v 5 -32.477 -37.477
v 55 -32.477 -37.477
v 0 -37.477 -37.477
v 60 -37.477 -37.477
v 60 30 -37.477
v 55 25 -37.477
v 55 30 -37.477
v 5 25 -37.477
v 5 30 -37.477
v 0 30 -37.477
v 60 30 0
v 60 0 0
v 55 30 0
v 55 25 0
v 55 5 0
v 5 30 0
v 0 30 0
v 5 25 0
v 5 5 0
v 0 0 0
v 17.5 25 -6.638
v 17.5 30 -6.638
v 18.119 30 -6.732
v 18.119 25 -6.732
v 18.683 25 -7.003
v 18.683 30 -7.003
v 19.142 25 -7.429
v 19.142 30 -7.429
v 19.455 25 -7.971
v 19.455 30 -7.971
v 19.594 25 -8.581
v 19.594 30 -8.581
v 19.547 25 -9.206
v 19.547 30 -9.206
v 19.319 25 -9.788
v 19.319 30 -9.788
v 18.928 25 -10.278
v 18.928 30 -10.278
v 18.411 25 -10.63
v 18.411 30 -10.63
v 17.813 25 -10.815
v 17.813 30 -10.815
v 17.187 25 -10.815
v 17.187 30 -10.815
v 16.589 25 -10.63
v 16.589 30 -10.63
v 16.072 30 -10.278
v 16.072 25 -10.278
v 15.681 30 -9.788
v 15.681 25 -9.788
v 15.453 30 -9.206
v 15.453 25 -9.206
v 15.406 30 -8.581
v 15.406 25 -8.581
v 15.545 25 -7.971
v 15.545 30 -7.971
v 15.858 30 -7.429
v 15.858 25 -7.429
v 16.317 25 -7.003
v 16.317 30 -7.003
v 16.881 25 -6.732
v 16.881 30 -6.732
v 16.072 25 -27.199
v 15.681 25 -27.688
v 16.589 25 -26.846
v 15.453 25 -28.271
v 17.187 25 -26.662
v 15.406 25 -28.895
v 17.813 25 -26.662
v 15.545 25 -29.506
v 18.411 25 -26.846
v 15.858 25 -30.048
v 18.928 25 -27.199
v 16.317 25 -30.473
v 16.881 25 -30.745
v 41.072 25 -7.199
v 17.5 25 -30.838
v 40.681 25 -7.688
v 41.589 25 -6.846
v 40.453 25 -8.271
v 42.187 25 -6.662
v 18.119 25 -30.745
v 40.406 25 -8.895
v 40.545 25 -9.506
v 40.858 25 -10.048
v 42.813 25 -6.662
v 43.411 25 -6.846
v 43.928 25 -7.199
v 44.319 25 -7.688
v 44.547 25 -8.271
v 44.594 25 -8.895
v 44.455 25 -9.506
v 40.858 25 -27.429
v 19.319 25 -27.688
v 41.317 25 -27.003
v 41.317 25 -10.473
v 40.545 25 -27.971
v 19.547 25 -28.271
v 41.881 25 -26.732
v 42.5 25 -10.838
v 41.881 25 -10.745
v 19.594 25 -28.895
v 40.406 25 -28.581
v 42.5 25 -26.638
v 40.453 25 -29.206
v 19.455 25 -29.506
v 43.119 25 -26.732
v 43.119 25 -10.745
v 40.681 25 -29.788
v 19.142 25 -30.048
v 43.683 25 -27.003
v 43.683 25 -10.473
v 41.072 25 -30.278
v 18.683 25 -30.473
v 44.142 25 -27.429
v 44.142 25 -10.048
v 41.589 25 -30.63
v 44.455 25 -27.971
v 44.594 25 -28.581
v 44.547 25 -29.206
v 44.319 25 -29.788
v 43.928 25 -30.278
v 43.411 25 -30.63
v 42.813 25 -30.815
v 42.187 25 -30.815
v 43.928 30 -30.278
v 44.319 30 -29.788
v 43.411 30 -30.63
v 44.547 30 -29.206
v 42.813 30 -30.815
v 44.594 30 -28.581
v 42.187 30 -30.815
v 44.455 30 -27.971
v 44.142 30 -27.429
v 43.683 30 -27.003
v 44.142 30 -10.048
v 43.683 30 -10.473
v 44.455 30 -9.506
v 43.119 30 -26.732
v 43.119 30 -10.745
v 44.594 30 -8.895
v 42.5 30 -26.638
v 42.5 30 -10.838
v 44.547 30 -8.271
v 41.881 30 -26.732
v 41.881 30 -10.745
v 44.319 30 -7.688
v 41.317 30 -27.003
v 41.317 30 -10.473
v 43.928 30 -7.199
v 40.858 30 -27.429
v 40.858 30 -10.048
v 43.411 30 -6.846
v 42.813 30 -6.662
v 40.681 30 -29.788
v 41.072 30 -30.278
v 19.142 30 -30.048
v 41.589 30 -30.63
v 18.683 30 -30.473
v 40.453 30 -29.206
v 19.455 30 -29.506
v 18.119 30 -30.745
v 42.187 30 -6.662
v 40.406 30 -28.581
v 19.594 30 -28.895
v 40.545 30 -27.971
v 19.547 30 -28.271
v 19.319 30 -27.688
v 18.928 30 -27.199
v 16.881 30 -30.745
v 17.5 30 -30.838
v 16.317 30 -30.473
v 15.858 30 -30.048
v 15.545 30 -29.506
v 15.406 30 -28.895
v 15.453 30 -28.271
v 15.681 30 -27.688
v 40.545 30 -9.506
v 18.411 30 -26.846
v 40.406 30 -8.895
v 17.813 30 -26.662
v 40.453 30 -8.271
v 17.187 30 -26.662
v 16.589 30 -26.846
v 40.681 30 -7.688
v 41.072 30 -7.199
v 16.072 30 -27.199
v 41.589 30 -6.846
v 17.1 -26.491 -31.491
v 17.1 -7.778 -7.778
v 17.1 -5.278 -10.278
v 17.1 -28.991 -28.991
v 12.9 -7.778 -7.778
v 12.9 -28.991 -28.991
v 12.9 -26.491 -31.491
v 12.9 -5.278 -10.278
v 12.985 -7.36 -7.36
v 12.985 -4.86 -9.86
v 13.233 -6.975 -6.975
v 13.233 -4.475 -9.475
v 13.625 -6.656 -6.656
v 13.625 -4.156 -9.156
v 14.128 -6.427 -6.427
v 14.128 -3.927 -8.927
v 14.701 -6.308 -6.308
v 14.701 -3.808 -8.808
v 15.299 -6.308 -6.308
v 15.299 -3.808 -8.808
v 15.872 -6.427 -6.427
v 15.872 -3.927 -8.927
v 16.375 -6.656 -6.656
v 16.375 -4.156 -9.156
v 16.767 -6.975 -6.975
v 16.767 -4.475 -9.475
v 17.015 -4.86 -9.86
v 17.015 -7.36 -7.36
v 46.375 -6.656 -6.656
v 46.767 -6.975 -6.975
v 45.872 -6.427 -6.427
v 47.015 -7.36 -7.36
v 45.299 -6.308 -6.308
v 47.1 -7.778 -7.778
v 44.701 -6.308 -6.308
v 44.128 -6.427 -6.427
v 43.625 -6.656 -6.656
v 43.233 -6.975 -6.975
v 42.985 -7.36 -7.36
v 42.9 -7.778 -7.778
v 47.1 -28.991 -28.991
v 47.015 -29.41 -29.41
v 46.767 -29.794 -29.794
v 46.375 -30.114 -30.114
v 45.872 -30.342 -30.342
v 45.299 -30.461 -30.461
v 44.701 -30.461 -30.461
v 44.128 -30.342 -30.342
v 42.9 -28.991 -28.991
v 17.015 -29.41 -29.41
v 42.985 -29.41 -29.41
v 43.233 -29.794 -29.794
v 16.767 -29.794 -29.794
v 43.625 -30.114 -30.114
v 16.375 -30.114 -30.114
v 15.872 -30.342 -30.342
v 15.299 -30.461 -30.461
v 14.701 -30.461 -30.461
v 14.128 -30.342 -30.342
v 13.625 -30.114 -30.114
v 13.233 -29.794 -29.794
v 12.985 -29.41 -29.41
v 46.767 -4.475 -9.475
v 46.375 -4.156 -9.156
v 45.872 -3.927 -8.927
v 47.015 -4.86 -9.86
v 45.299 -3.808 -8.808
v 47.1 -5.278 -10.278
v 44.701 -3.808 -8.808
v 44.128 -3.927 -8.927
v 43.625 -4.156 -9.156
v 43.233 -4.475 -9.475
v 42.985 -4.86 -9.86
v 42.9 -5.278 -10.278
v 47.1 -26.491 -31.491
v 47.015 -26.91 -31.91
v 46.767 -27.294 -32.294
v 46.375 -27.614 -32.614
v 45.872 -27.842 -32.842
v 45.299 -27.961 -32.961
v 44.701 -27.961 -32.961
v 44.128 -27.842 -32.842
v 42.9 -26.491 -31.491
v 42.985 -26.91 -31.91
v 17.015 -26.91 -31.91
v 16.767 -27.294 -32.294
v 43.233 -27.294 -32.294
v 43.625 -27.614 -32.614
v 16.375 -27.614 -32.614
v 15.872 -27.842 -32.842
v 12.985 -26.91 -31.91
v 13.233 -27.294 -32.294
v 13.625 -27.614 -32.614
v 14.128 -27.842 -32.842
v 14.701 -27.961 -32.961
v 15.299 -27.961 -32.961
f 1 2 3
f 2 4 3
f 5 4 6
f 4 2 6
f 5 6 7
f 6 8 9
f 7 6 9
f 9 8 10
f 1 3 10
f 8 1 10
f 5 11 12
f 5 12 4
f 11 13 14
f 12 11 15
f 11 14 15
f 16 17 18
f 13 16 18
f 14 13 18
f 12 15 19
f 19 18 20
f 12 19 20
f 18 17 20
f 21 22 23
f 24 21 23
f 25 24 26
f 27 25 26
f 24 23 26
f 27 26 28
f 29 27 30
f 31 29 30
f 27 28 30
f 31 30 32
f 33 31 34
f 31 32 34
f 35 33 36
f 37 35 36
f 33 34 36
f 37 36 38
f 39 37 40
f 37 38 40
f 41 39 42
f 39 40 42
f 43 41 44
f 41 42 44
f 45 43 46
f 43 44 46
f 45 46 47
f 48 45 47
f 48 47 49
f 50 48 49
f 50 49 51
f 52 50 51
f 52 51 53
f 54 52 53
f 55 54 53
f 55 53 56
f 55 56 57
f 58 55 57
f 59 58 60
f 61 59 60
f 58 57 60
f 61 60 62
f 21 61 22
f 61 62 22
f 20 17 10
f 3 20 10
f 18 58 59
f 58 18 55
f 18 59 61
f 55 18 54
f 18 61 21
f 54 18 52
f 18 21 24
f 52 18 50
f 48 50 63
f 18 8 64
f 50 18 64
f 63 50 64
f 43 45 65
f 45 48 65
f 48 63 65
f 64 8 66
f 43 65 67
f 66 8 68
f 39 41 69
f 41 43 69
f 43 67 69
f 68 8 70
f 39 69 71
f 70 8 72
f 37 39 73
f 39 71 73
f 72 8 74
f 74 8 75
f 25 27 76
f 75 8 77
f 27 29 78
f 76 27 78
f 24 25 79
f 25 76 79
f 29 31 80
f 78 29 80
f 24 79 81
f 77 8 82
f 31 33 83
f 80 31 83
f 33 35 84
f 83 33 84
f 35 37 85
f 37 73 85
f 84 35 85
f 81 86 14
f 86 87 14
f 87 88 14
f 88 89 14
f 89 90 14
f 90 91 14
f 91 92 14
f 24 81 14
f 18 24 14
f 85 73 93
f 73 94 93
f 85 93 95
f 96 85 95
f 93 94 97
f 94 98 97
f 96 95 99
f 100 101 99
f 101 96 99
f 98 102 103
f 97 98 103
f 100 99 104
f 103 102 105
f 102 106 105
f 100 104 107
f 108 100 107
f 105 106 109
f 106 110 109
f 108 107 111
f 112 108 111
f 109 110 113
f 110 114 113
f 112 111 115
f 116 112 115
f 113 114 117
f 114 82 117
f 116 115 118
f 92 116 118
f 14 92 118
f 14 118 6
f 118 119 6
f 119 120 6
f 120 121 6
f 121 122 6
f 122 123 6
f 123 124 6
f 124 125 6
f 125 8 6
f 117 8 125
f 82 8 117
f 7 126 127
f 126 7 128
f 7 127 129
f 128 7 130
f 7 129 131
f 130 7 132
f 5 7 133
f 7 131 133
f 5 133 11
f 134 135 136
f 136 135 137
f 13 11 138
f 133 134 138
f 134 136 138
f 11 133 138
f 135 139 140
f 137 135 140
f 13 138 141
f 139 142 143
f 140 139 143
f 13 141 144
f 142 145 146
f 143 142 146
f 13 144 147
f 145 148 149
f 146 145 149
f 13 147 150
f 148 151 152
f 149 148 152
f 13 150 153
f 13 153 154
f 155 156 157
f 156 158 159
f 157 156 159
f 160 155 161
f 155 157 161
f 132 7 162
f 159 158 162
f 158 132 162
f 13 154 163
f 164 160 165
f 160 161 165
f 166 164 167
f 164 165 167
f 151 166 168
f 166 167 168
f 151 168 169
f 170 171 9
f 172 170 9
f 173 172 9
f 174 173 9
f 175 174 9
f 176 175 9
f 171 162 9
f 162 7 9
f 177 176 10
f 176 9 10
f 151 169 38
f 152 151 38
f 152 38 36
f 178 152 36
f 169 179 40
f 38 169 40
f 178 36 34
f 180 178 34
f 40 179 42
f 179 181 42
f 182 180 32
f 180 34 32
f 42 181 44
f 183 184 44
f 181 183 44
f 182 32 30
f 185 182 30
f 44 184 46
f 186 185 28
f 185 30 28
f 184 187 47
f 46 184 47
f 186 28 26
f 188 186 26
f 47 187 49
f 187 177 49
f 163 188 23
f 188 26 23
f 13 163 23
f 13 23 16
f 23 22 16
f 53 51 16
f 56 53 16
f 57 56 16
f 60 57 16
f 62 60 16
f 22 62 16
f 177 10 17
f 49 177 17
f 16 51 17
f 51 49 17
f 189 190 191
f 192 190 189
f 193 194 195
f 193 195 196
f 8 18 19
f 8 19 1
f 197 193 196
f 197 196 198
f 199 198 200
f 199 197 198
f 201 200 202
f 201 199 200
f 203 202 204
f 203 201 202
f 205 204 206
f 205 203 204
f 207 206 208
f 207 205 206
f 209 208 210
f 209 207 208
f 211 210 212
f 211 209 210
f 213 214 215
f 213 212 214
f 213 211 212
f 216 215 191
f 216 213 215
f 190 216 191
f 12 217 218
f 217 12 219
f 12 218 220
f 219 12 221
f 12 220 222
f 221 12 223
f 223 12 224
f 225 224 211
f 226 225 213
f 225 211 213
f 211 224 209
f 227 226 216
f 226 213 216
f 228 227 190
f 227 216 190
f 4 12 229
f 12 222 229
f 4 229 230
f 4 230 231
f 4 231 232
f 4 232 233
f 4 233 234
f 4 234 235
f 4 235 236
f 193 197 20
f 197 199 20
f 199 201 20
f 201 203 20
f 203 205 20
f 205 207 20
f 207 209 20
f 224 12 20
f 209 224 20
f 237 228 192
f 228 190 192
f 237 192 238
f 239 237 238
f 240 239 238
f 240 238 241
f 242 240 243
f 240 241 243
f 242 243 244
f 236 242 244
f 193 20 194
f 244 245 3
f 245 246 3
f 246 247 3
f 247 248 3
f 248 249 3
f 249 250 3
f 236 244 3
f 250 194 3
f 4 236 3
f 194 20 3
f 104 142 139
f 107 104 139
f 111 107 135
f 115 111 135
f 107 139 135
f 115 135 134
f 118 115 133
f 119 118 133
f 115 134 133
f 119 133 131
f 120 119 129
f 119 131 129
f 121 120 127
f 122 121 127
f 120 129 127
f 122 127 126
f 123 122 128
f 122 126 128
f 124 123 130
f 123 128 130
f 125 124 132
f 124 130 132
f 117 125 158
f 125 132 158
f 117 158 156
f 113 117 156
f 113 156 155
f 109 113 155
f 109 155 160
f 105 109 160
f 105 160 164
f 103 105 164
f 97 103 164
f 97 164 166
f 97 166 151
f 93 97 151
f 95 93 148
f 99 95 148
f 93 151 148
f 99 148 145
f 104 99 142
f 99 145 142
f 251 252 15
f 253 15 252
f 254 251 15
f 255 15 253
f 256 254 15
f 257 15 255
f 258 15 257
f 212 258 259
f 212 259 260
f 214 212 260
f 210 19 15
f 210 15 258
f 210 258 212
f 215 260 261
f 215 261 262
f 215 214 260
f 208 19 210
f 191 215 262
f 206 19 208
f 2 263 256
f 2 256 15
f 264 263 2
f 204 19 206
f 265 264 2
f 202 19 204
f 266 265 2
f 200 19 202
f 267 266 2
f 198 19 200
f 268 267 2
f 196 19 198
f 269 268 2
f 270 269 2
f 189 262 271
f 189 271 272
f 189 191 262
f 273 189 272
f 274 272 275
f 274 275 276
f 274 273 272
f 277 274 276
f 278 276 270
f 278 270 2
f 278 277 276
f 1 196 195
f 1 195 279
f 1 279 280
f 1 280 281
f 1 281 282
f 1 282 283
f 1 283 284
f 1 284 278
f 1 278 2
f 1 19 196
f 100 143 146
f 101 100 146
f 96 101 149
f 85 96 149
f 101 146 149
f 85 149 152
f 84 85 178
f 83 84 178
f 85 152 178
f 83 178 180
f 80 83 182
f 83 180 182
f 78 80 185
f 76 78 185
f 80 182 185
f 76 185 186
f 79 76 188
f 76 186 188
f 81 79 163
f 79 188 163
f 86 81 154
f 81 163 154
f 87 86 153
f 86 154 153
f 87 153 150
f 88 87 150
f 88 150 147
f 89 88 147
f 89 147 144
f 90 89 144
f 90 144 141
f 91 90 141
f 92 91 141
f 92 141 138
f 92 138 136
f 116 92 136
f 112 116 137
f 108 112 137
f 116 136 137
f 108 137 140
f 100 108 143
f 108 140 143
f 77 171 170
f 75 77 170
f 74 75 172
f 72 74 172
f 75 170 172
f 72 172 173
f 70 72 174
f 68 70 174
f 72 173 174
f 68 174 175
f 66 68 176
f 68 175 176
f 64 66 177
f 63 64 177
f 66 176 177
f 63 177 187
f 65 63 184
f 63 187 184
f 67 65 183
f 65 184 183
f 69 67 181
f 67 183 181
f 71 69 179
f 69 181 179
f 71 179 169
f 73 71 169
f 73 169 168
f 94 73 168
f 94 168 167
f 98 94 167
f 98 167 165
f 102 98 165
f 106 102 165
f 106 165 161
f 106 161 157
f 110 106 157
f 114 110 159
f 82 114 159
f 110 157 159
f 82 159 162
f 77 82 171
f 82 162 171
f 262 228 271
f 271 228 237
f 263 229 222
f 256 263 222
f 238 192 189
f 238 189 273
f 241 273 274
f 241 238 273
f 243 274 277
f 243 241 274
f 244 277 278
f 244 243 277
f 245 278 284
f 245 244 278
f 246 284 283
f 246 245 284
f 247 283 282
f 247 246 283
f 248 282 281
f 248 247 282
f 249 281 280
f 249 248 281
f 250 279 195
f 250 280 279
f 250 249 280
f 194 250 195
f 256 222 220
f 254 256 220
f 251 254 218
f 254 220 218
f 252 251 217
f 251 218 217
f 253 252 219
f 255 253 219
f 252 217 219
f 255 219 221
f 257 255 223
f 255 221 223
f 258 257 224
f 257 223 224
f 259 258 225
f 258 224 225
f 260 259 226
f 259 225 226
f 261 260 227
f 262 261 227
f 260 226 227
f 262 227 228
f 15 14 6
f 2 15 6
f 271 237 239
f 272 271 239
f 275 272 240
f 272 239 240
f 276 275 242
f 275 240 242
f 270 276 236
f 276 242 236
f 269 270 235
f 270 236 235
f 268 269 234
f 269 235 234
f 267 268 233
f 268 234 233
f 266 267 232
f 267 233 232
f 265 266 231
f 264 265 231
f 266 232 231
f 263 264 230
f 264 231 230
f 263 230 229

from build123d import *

# Parameters (mm, degrees)
EXTRUDE_1_DEPTH     = 5
EXTRUDE_3_DEPTH     = 50
CUT_EXTRUDE_2_DEPTH = 50
EXTRUDE_4_DEPTH     = 5
SKETCH_6_W          = 60
SKETCH_6_H          = 37.476659403
EXTRUDE_5_DEPTH     = 5
SKETCH_7_R          = 2.1
CUT_EXTRUDE_3_DEPTH = 5


with BuildPart() as part:
    # 草图2 → 凸台-拉伸1 (new body)
    with BuildSketch(Plane(origin=(0, 0, 0), x_dir=(0, 0, -1), z_dir=(1, 0, 0))):
        Polygon((0, 30), (0, 0), (37.476659403, -37.476659403), (37.476659403, 30), align=None)
    extrude(amount=EXTRUDE_1_DEPTH)

    # 草图4 → 凸台-拉伸3 (add)
    with BuildSketch(Plane(origin=(5, 0, 0), x_dir=(0, 0, -1), z_dir=(1, 0, 0))):
        Polygon((0, 0), (0, 5), (37.476659403, -32.476659403), (37.476659403, -37.476659403), align=None)
    extrude(amount=EXTRUDE_3_DEPTH)

    # 草图3 → 切除-拉伸2 (cut)
    with BuildSketch(Plane(origin=(0, 0, 0), x_dir=(1, 0, 0), z_dir=(0, -0.7071067811865489, 0.7071067811865462))):
        with BuildLine():
            ThreePointArc((17.1, -41), (15, -43.1), (12.9, -41))
            Line((12.9, -41), (12.9, -11))
            ThreePointArc((12.9, -11), (15, -8.9), (17.1, -11))
            Line((17.1, -11), (17.1, -41))
        make_face()
        with BuildLine():
            Line((42.9, -11), (42.9, -41))
            ThreePointArc((42.9, -41), (45, -43.1), (47.1, -41))
            Line((47.1, -41), (47.1, -11))
            ThreePointArc((47.1, -11), (45, -8.9), (42.9, -11))
        make_face()
    extrude(amount=-CUT_EXTRUDE_2_DEPTH, mode=Mode.SUBTRACT)

    # 草图5 → 凸台-拉伸4 (add)
    with BuildSketch(Plane(origin=(55, 0, 0), x_dir=(0, 0, -1), z_dir=(1, 0, 0))):
        Polygon((0, 30), (0, 0), (37.476659403, -37.476659403), (37.476659403, 30), align=None)
    extrude(amount=EXTRUDE_4_DEPTH)

    # 草图6 → 凸台-拉伸5 (add)
    with BuildSketch(Plane(origin=(0, 30, 0), x_dir=(1, 0, 0), z_dir=(0, 1, 0))):
        with Locations((30, 18.738329701)):
            Rectangle(SKETCH_6_W, SKETCH_6_H)
    extrude(amount=-EXTRUDE_5_DEPTH)

    # 草图7 → 切除-拉伸3 (cut)
    with BuildSketch(Plane(origin=(0, 30, 0), x_dir=(1, 0, 0), z_dir=(0, 1, 0))):
        with Locations(Location((42.5, 28.738329701, 0), (0, 0, 270))):
            Circle(SKETCH_7_R)
        with Locations(Location((17.5, 28.738329701, 0), (0, 0, 90))):
            Circle(SKETCH_7_R)
        with Locations(Location((42.5, 8.738329701, 0), (0, 0, 90))):
            Circle(SKETCH_7_R)
        with Locations(Location((17.5, 8.738329701, 0), (0, 0, 270))):
            Circle(SKETCH_7_R)
    extrude(amount=-CUT_EXTRUDE_3_DEPTH, mode=Mode.SUBTRACT)


solid = part.part
